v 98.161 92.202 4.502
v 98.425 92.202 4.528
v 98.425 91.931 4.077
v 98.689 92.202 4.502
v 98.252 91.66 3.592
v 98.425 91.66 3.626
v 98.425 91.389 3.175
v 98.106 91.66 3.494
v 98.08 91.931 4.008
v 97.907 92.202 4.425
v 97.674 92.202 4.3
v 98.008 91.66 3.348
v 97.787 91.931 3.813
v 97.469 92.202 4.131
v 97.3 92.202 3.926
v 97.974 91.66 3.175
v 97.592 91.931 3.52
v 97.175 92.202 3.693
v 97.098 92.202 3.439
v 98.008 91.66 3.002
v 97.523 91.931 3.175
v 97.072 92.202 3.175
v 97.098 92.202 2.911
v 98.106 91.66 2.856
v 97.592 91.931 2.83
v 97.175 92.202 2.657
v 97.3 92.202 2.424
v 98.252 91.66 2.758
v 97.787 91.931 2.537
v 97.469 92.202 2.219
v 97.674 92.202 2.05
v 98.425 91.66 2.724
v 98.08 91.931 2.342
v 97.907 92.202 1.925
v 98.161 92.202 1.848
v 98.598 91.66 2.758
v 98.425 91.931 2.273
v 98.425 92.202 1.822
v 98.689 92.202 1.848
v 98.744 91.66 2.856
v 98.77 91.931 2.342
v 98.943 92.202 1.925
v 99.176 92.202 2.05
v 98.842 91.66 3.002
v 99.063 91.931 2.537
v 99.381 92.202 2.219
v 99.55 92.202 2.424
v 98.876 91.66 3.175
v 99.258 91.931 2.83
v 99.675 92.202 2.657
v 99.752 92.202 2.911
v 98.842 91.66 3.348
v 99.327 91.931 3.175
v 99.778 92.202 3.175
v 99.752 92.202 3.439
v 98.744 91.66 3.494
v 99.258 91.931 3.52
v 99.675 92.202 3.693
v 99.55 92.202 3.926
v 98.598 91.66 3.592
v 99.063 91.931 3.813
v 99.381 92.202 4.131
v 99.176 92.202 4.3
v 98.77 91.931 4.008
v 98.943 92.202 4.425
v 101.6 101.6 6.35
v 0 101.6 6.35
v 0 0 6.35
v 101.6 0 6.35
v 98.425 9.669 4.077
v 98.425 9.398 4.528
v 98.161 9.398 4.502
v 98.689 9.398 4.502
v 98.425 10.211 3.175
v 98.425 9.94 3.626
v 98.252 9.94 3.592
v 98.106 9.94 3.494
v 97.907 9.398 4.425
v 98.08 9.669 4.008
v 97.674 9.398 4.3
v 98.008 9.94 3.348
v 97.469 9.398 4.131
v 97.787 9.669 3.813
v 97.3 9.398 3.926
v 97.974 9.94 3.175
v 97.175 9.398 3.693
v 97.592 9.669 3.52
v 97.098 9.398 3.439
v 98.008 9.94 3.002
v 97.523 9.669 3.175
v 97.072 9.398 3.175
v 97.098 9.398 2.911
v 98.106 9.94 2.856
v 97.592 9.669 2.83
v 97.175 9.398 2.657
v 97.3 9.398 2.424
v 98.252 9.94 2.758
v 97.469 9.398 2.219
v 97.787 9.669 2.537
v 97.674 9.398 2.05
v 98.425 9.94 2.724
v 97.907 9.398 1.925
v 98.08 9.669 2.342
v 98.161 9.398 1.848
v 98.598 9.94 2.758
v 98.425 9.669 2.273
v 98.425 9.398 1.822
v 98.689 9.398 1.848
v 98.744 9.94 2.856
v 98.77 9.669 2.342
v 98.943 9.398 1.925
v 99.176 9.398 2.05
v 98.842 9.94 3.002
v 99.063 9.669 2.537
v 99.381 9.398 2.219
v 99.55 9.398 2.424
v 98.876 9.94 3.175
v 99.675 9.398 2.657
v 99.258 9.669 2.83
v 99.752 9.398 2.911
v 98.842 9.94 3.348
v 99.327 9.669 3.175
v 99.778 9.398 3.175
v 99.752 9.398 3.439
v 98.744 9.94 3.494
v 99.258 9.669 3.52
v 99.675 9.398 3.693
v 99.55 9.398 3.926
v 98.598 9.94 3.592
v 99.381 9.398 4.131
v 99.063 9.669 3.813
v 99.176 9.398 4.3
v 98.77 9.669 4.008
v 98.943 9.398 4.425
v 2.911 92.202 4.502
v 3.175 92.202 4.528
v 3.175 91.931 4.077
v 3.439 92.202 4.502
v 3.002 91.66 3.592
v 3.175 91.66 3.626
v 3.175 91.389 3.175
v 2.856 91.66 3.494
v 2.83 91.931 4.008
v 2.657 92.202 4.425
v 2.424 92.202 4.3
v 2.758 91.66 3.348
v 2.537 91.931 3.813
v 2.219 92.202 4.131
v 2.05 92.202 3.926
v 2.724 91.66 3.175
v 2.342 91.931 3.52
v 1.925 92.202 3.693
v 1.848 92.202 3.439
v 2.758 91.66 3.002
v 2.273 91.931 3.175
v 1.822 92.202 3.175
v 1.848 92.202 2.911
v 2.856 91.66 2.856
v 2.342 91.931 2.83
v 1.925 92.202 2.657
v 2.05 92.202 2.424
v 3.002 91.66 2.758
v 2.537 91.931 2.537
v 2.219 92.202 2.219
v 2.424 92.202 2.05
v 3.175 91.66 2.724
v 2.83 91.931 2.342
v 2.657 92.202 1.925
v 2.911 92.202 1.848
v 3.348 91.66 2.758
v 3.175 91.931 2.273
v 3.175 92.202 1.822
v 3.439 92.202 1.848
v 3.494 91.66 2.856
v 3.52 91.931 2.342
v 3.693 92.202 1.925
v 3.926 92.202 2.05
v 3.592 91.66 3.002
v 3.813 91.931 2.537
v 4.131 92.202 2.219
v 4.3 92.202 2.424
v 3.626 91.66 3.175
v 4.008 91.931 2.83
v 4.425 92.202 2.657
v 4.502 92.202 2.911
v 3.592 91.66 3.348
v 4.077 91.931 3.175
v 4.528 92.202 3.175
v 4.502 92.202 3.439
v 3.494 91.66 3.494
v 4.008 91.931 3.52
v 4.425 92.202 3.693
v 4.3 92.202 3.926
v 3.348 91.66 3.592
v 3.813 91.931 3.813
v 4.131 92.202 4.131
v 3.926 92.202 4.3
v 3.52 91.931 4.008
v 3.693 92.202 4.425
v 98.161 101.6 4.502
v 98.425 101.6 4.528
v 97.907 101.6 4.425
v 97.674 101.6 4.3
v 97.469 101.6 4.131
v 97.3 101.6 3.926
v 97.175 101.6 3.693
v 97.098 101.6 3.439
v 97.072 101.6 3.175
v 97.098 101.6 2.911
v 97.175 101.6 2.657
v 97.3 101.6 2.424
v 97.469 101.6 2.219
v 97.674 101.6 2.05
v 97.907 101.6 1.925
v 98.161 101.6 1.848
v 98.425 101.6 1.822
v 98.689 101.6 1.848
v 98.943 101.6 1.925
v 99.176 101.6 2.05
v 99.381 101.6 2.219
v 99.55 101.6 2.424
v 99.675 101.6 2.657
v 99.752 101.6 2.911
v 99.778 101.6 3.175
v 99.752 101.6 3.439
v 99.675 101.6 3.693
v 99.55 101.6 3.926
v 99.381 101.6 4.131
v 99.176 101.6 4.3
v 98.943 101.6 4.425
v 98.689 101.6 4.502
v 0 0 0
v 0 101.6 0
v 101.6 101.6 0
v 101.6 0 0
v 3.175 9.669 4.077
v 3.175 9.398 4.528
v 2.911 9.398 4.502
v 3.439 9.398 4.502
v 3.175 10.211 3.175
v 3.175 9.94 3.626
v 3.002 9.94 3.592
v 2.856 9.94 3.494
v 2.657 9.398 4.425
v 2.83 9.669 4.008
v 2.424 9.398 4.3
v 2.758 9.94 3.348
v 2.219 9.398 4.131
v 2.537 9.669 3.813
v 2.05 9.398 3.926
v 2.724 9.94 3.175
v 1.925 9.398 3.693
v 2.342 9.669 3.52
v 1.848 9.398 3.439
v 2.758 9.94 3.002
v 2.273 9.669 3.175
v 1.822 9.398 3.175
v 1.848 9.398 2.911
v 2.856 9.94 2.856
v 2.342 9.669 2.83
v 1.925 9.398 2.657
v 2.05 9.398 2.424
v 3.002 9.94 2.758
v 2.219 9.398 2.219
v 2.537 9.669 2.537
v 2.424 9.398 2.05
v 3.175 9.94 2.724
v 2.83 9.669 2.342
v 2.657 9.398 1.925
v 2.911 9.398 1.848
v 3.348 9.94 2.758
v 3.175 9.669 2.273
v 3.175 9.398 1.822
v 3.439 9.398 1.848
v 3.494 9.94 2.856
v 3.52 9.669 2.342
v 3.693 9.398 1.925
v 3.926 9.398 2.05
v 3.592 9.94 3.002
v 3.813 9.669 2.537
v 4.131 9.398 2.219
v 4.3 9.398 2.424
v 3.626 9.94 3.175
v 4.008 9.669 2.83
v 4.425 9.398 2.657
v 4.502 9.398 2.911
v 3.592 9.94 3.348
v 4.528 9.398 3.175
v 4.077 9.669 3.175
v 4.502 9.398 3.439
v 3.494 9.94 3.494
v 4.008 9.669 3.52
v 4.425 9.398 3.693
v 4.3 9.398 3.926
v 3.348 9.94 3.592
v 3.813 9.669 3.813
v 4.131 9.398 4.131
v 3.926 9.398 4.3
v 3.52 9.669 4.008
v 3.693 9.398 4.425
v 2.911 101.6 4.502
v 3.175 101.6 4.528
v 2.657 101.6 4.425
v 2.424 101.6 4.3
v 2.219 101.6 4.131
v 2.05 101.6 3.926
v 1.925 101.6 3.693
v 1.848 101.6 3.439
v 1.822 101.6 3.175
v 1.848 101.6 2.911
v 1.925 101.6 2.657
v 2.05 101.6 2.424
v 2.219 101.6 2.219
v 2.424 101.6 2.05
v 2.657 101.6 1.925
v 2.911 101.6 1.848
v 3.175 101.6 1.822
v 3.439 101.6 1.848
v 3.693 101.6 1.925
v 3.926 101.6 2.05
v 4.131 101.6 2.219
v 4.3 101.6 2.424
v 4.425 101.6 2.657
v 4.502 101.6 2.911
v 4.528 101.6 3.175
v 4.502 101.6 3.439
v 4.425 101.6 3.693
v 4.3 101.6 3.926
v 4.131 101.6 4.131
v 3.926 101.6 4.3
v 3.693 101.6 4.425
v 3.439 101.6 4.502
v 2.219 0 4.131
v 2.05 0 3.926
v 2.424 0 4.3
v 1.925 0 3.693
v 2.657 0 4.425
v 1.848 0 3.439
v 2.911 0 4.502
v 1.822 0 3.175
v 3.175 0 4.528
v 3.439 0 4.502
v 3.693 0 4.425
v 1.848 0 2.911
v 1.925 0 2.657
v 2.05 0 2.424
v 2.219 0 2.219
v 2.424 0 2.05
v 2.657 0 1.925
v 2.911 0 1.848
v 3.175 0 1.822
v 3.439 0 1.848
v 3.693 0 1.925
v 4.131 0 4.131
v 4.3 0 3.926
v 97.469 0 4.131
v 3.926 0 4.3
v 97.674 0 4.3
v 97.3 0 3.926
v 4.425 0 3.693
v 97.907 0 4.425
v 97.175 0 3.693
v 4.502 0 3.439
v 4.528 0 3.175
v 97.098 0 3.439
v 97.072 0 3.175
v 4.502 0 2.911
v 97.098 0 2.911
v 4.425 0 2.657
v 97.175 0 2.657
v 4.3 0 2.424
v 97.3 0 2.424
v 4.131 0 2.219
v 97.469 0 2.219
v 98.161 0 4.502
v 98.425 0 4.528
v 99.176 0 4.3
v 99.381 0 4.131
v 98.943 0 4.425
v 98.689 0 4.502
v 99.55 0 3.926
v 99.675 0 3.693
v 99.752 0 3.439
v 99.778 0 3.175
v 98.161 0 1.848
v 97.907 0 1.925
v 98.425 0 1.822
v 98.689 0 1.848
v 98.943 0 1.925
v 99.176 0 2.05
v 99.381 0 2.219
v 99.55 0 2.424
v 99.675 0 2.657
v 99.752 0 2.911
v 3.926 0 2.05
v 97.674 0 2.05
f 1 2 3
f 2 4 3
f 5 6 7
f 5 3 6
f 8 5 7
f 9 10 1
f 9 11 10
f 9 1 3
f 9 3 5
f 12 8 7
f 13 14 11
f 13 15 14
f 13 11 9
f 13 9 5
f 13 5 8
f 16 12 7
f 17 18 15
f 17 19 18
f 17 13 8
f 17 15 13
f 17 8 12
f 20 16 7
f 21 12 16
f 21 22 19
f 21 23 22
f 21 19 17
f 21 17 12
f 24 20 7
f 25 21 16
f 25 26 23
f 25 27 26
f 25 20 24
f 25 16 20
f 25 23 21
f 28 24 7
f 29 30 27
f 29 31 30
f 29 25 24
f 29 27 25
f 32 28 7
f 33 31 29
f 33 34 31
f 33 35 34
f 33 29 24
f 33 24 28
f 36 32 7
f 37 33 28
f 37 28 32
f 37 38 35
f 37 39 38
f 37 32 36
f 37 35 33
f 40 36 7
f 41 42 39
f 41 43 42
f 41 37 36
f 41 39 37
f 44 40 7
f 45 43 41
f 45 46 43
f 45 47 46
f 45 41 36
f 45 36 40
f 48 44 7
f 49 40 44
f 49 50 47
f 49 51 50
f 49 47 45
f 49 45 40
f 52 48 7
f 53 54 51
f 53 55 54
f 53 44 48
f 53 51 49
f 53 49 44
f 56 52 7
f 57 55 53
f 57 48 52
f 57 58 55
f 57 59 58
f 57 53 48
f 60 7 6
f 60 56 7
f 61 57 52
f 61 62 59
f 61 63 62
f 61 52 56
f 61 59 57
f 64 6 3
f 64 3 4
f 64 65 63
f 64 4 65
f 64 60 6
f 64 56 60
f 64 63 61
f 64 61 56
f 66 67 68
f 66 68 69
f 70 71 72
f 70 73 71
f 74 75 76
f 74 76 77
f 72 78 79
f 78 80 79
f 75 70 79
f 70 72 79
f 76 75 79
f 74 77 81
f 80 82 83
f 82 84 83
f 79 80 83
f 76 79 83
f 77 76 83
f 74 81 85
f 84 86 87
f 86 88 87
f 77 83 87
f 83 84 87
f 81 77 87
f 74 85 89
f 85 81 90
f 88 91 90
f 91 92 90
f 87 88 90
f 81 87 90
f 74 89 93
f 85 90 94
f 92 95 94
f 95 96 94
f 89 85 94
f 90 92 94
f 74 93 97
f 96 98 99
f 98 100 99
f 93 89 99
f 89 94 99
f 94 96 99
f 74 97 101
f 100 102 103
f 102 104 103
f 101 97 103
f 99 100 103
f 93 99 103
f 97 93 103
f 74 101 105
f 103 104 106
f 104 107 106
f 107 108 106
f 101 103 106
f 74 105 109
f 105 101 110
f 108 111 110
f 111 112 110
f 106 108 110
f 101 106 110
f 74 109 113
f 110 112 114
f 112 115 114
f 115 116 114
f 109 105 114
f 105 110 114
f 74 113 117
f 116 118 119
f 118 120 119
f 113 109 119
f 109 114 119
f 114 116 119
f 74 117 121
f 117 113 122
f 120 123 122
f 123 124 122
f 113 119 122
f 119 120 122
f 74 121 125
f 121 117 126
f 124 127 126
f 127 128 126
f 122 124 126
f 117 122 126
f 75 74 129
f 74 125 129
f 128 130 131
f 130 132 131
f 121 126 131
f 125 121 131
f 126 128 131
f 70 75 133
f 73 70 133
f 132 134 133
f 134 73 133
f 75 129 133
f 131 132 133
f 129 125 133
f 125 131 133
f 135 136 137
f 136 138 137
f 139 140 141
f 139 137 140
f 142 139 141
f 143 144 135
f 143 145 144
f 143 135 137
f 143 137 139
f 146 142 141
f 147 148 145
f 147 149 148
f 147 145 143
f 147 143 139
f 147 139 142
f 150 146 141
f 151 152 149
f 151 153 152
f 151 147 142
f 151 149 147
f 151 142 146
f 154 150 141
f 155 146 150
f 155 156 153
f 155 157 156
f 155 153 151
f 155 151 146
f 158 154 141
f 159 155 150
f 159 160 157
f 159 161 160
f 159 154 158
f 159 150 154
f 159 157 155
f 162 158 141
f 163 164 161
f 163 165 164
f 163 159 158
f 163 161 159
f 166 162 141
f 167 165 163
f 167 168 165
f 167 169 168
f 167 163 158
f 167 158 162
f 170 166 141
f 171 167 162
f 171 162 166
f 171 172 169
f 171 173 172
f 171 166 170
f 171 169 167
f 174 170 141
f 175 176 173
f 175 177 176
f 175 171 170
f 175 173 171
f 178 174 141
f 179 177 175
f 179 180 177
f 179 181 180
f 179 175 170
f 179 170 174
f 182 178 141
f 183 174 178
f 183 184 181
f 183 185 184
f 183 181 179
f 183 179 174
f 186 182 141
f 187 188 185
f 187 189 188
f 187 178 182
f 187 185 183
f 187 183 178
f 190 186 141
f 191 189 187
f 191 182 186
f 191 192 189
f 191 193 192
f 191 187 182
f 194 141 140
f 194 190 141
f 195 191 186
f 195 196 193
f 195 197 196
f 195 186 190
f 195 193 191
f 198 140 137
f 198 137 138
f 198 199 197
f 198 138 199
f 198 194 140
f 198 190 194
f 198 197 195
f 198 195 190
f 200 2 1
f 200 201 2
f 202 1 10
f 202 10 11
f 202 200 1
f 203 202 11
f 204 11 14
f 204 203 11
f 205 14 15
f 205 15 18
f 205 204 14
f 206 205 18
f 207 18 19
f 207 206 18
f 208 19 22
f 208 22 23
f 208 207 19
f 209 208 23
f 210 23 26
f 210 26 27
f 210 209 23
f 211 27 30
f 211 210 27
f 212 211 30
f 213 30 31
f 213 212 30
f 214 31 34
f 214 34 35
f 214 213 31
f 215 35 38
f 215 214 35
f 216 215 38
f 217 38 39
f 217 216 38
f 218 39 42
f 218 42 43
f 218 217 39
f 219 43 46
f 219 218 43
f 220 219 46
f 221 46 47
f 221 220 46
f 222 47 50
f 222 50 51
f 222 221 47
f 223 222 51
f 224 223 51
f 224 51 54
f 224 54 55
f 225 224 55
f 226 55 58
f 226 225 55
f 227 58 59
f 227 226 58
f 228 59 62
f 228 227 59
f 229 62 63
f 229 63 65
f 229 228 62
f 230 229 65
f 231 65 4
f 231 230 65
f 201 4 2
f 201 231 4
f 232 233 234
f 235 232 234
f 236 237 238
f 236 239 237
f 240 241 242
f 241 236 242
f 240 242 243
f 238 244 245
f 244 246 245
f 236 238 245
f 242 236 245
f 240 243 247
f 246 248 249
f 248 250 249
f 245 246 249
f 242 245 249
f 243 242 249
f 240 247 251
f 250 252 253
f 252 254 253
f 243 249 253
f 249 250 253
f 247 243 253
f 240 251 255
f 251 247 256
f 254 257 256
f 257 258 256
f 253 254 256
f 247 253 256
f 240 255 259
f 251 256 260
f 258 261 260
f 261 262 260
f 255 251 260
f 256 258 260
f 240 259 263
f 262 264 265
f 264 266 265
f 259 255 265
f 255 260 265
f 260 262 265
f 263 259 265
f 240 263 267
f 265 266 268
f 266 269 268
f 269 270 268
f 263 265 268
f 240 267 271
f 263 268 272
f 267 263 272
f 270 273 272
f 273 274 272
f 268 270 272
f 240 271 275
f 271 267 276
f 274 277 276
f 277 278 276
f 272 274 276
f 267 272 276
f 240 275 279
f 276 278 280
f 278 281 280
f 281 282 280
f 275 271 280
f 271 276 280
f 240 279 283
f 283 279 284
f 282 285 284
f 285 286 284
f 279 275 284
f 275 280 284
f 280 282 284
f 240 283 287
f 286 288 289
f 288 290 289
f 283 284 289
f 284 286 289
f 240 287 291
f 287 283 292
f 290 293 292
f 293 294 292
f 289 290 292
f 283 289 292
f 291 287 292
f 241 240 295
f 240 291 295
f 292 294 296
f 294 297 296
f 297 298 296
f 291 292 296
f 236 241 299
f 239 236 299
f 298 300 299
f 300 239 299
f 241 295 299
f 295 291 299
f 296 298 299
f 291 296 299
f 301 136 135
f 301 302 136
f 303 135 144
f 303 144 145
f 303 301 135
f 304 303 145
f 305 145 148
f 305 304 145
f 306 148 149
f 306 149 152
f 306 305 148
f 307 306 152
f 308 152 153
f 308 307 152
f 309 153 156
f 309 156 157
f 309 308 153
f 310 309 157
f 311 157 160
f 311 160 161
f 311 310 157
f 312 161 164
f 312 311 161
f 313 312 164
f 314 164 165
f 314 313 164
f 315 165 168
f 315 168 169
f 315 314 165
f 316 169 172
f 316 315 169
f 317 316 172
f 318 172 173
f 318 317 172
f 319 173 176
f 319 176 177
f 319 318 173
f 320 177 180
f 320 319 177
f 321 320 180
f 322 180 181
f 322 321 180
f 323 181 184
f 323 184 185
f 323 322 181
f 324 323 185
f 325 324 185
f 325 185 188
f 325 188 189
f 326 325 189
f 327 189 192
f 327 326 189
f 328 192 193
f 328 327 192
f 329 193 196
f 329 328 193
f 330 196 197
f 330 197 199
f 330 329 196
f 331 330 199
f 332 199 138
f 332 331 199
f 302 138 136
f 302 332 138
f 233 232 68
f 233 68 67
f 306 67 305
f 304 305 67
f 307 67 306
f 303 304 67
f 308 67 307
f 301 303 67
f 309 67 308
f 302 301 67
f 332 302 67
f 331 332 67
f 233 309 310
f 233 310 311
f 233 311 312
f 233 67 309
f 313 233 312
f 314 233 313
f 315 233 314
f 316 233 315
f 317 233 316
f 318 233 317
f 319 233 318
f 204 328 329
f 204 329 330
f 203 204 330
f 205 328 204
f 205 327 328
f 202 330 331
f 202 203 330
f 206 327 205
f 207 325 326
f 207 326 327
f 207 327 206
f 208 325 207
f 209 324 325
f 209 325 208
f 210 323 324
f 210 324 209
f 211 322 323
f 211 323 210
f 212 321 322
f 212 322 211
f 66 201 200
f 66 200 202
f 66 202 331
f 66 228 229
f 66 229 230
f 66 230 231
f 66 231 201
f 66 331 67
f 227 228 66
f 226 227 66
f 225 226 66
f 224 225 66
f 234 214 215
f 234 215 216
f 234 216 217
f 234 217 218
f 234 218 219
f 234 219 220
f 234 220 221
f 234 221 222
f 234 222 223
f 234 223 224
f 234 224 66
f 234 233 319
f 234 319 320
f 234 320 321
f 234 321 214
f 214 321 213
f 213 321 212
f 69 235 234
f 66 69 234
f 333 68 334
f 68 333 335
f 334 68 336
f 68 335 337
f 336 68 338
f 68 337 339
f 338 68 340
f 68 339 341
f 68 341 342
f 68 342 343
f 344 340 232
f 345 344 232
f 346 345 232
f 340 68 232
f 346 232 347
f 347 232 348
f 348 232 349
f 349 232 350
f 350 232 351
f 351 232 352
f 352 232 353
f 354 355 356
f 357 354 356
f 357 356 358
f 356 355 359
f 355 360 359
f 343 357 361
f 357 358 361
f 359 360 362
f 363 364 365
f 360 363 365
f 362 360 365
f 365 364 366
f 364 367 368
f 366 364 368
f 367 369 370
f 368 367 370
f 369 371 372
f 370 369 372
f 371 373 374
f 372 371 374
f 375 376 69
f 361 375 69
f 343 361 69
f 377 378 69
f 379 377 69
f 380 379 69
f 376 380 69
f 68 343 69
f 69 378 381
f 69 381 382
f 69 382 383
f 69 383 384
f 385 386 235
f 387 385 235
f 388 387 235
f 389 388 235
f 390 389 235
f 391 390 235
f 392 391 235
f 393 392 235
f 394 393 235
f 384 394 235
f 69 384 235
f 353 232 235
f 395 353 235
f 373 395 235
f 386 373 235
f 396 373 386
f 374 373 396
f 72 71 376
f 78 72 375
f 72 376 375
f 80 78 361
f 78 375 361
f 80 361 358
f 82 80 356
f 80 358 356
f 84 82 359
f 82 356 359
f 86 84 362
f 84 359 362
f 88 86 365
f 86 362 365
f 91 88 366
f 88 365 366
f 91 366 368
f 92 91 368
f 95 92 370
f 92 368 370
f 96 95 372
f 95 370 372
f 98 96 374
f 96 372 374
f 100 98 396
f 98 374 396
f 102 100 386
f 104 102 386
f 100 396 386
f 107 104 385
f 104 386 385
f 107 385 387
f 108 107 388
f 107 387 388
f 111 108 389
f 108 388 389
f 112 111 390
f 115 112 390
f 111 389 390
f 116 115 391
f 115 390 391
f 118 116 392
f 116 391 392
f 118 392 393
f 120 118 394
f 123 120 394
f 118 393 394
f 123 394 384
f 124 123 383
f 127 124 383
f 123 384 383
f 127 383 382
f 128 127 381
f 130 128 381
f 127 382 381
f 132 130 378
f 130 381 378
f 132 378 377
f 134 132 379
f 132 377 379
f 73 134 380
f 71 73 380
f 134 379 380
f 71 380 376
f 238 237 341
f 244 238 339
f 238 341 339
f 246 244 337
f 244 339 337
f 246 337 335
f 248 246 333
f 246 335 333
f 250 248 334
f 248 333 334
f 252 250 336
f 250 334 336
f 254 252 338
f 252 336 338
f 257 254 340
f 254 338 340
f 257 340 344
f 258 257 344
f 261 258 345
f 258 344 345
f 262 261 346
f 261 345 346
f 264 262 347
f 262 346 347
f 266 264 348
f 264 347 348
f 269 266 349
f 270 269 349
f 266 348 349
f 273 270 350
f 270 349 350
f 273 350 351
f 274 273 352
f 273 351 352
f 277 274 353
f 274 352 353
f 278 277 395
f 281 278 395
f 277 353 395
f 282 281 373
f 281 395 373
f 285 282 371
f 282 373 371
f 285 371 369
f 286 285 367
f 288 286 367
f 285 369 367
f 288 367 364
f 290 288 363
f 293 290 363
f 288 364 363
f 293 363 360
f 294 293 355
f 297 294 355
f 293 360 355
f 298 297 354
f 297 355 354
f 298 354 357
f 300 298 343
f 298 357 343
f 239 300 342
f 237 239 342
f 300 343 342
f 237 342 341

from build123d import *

# Parameters (mm, degrees)
SKETCH2_W                      = 101.6
SKETCH2_H                      = 101.6
BOSS_EXTRUDE1_DEPTH            = 6.35
F_6_32_TAPPED_HOLE1_AT_2_COUNT = 2
F_6_32_TAPPED_HOLE1_AT_2_PITCH = 95.25


with BuildPart() as part:
    # Sketch2 → Boss-Extrude1 (new body)
    with BuildSketch(Plane.XY):
        with Locations((50.8, 50.8)):
            Rectangle(SKETCH2_W, SKETCH2_H)
    extrude(amount=BOSS_EXTRUDE1_DEPTH)

    # Sketch7 → #6-32 Tapped Hole1 (revolve, cut)
    with BuildSketch(Plane(origin=(3.175, 101.6, 3.175), x_dir=(0, 0, 1), z_dir=(1, 0, 0))):
        Polygon((0, 0), (0, 10.21069403), (1.35255, 9.398), (1.35255, 0), align=None)
    f_6_32_tapped_hole1 = revolve(axis=Axis((3.175, 107.95, 3.175), (0, -1, 0)), mode=Mode.SUBTRACT)

    # #6-32 Tapped Hole1 at 2: #6-32 Tapped Hole1 ×2
    with Locations(*[(i * F_6_32_TAPPED_HOLE1_AT_2_PITCH, 0, 0) for i in range(1, F_6_32_TAPPED_HOLE1_AT_2_COUNT)]):
        add(f_6_32_tapped_hole1, mode=Mode.SUBTRACT)

    # Mirror1: #6-32 Tapped Hole1 across plane
    add(f_6_32_tapped_hole1.mirror(Plane.ZX.offset(50.8)), mode=Mode.SUBTRACT)

    # Mirror1 copy 1 sketch → Mirror1 copy 1 (revolve, cut)
    with BuildSketch(Plane(origin=(98.425, 0, 3.175), x_dir=(0, 0, 1), z_dir=(1, 0, 0))):
        Polygon((0, 0), (0, -10.21069403), (1.35255, -9.398), (1.35255, 0), align=None)
    revolve(axis=Axis((98.425, -6.35, 3.175), (0, -1, 0)), mode=Mode.SUBTRACT)


solid = part.part
